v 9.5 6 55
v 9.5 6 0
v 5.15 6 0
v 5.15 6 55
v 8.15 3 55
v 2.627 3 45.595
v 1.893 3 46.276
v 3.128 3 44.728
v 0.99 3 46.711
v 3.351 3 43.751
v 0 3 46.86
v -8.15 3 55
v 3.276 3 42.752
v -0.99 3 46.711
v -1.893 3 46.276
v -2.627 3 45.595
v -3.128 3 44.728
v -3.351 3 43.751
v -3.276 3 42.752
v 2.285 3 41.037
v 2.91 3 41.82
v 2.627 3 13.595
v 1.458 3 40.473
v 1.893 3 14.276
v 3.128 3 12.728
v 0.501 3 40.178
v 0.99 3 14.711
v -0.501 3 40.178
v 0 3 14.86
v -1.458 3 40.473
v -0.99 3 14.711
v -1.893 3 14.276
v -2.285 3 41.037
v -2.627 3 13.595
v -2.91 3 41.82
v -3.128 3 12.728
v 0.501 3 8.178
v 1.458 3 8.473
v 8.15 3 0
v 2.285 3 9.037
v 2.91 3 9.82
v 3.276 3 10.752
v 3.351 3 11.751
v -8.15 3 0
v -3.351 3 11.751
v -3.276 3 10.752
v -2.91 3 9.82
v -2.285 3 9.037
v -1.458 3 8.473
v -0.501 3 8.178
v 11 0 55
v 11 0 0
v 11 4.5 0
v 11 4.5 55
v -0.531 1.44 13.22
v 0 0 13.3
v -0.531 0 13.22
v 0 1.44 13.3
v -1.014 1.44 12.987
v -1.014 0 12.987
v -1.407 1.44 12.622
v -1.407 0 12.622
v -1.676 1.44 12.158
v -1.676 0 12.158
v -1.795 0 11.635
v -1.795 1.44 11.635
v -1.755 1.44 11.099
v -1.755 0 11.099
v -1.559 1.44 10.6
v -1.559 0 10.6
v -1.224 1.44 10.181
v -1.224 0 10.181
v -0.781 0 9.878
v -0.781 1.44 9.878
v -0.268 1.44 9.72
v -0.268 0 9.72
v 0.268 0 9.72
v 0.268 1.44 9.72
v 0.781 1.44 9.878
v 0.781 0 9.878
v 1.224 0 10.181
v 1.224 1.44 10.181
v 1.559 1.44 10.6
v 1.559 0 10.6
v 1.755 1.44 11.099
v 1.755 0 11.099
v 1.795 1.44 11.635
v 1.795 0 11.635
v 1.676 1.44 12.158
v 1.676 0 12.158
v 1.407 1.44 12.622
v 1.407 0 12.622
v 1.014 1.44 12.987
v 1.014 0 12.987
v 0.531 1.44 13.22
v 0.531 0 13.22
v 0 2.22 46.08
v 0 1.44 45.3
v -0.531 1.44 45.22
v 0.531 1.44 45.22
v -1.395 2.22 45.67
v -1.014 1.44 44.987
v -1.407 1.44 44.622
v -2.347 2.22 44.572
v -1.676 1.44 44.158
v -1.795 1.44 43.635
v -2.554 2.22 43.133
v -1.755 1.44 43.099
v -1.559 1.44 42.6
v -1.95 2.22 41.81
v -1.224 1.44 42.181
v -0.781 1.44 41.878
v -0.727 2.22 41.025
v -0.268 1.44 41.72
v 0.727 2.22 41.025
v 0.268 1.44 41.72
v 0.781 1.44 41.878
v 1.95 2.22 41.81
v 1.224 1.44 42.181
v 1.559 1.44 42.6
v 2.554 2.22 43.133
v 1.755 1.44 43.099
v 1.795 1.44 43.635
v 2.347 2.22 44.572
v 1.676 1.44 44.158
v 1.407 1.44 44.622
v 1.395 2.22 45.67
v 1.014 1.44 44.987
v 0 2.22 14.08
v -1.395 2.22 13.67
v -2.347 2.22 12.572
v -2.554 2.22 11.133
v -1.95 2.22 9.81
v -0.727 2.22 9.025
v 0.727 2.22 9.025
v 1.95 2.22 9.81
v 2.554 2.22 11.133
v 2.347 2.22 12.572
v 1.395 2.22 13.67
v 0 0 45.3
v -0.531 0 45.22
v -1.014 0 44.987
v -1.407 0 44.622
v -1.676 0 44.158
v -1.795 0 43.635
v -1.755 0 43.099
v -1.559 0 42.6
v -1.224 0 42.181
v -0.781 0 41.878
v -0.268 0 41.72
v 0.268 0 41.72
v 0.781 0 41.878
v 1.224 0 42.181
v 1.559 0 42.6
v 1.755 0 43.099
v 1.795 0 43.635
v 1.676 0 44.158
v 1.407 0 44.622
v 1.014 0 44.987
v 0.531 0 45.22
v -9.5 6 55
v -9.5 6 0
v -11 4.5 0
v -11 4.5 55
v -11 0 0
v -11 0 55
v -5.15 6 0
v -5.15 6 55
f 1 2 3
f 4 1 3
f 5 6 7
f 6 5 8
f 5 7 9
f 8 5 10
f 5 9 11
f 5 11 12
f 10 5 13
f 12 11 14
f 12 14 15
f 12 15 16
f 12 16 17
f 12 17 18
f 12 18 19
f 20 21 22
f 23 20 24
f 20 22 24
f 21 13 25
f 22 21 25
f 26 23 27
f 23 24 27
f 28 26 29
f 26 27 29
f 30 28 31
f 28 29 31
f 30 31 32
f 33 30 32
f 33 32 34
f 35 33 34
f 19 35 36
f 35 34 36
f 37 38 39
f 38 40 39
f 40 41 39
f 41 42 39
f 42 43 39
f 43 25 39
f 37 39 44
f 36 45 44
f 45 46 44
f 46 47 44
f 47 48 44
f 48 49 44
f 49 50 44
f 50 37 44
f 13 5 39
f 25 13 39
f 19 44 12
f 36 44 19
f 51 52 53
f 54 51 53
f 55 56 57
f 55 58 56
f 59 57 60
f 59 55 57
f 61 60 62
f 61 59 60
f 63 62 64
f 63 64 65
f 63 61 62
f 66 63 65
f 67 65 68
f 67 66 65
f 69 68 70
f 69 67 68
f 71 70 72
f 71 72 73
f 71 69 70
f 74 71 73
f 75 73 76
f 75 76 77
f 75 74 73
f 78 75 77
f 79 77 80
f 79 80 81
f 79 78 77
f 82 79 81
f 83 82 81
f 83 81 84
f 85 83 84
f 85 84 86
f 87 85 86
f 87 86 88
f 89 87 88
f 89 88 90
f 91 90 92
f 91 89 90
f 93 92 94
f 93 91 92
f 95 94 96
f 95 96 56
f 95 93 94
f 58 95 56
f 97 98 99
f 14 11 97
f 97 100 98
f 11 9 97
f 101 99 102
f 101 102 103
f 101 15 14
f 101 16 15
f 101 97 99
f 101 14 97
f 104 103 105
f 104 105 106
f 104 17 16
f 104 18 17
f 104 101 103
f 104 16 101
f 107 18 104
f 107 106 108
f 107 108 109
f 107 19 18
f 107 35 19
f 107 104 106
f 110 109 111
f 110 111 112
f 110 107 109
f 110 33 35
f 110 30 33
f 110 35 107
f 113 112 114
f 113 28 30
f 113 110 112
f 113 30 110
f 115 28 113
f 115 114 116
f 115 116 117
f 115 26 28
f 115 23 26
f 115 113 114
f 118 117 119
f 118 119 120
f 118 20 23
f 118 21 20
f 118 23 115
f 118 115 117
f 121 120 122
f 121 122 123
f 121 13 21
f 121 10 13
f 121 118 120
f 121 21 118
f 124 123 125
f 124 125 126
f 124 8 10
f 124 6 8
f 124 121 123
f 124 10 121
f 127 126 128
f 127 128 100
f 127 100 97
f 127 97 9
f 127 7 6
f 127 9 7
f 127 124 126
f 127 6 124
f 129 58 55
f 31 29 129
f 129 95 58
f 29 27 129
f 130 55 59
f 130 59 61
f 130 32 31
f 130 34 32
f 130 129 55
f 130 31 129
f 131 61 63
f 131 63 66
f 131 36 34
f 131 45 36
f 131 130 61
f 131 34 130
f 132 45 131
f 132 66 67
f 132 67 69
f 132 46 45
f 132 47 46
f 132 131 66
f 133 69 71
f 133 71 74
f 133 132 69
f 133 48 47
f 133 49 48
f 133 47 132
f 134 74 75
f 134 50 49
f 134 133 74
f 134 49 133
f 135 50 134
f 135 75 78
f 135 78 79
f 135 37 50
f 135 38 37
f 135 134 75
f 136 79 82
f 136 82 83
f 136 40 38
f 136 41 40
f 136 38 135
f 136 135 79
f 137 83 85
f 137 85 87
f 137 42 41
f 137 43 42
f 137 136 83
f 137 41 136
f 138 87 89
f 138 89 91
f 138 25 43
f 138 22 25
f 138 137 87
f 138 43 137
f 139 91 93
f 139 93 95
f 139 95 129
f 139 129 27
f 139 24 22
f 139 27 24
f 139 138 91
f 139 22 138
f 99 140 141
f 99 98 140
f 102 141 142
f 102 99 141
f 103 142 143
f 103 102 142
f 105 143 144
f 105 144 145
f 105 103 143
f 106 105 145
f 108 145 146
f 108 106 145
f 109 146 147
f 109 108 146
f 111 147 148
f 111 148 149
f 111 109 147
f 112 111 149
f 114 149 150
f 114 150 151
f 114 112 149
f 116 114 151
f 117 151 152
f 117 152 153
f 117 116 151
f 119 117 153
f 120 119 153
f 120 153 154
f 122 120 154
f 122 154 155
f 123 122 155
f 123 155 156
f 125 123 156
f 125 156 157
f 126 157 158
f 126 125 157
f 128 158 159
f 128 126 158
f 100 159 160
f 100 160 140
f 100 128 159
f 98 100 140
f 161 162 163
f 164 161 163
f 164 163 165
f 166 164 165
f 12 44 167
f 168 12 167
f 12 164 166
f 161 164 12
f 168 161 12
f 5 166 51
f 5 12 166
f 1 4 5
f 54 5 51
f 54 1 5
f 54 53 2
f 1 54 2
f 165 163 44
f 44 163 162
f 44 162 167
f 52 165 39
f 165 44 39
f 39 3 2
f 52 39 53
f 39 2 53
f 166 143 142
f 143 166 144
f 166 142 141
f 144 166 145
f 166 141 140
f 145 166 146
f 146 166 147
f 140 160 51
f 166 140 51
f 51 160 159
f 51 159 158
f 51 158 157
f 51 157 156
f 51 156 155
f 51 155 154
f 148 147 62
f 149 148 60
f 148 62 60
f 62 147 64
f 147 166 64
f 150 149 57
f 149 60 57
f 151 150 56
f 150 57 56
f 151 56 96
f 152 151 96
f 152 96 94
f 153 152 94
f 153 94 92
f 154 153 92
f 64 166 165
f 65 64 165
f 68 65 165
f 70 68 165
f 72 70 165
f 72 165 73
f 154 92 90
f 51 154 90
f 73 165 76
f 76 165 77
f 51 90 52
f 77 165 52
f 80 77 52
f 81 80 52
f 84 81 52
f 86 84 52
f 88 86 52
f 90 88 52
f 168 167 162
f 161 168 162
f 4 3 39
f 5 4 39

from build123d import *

# Parameters (mm, degrees)
BOSS_EXTRUDE1_DEPTH                          = 55
CSK_FOR_M3_HEX_SOCKET_COUNTERSUNK_CA_2_COUNT = 2
CSK_FOR_M3_HEX_SOCKET_COUNTERSUNK_CA_2_PITCH = 32


with BuildPart() as part:
    # Sketch2 → Boss-Extrude1 (new body)
    with BuildSketch(Plane.XY):
        Polygon((-11, 0), (11, 0), (11, 4.5), (9.5, 6), (5.15, 6), (8.15, 3), (-8.15, 3), (-5.15, 6), (-9.5, 6), (-11, 4.5), align=None)
    extrude(amount=BOSS_EXTRUDE1_DEPTH)

    # Sketch4 → CSK for M3 Hex Socket Countersunk Cap Screw1 (revolve, cut)
    with BuildSketch(Plane(origin=(0, 3, 11.5), x_dir=(0, 0, 1), z_dir=(1, 0, 0))):
        Polygon((0, 0), (0, 3), (1.8, 3), (1.8, 1.56), (3.36, 0), align=None)
    csk_for_m3_hex_socket_countersunk_cap_sc = revolve(axis=Axis((0, 9.35, 11.5), (0, -1, 0)), mode=Mode.SUBTRACT)

    # CSK for M3 Hex Socket Countersunk Ca 2: CSK for M3 Hex Socket Countersunk Cap Screw1 ×2
    with Locations(*[(0, 0, i * CSK_FOR_M3_HEX_SOCKET_COUNTERSUNK_CA_2_PITCH) for i in range(1, CSK_FOR_M3_HEX_SOCKET_COUNTERSUNK_CA_2_COUNT)]):
        add(csk_for_m3_hex_socket_countersunk_cap_sc, mode=Mode.SUBTRACT)


solid = part.part
